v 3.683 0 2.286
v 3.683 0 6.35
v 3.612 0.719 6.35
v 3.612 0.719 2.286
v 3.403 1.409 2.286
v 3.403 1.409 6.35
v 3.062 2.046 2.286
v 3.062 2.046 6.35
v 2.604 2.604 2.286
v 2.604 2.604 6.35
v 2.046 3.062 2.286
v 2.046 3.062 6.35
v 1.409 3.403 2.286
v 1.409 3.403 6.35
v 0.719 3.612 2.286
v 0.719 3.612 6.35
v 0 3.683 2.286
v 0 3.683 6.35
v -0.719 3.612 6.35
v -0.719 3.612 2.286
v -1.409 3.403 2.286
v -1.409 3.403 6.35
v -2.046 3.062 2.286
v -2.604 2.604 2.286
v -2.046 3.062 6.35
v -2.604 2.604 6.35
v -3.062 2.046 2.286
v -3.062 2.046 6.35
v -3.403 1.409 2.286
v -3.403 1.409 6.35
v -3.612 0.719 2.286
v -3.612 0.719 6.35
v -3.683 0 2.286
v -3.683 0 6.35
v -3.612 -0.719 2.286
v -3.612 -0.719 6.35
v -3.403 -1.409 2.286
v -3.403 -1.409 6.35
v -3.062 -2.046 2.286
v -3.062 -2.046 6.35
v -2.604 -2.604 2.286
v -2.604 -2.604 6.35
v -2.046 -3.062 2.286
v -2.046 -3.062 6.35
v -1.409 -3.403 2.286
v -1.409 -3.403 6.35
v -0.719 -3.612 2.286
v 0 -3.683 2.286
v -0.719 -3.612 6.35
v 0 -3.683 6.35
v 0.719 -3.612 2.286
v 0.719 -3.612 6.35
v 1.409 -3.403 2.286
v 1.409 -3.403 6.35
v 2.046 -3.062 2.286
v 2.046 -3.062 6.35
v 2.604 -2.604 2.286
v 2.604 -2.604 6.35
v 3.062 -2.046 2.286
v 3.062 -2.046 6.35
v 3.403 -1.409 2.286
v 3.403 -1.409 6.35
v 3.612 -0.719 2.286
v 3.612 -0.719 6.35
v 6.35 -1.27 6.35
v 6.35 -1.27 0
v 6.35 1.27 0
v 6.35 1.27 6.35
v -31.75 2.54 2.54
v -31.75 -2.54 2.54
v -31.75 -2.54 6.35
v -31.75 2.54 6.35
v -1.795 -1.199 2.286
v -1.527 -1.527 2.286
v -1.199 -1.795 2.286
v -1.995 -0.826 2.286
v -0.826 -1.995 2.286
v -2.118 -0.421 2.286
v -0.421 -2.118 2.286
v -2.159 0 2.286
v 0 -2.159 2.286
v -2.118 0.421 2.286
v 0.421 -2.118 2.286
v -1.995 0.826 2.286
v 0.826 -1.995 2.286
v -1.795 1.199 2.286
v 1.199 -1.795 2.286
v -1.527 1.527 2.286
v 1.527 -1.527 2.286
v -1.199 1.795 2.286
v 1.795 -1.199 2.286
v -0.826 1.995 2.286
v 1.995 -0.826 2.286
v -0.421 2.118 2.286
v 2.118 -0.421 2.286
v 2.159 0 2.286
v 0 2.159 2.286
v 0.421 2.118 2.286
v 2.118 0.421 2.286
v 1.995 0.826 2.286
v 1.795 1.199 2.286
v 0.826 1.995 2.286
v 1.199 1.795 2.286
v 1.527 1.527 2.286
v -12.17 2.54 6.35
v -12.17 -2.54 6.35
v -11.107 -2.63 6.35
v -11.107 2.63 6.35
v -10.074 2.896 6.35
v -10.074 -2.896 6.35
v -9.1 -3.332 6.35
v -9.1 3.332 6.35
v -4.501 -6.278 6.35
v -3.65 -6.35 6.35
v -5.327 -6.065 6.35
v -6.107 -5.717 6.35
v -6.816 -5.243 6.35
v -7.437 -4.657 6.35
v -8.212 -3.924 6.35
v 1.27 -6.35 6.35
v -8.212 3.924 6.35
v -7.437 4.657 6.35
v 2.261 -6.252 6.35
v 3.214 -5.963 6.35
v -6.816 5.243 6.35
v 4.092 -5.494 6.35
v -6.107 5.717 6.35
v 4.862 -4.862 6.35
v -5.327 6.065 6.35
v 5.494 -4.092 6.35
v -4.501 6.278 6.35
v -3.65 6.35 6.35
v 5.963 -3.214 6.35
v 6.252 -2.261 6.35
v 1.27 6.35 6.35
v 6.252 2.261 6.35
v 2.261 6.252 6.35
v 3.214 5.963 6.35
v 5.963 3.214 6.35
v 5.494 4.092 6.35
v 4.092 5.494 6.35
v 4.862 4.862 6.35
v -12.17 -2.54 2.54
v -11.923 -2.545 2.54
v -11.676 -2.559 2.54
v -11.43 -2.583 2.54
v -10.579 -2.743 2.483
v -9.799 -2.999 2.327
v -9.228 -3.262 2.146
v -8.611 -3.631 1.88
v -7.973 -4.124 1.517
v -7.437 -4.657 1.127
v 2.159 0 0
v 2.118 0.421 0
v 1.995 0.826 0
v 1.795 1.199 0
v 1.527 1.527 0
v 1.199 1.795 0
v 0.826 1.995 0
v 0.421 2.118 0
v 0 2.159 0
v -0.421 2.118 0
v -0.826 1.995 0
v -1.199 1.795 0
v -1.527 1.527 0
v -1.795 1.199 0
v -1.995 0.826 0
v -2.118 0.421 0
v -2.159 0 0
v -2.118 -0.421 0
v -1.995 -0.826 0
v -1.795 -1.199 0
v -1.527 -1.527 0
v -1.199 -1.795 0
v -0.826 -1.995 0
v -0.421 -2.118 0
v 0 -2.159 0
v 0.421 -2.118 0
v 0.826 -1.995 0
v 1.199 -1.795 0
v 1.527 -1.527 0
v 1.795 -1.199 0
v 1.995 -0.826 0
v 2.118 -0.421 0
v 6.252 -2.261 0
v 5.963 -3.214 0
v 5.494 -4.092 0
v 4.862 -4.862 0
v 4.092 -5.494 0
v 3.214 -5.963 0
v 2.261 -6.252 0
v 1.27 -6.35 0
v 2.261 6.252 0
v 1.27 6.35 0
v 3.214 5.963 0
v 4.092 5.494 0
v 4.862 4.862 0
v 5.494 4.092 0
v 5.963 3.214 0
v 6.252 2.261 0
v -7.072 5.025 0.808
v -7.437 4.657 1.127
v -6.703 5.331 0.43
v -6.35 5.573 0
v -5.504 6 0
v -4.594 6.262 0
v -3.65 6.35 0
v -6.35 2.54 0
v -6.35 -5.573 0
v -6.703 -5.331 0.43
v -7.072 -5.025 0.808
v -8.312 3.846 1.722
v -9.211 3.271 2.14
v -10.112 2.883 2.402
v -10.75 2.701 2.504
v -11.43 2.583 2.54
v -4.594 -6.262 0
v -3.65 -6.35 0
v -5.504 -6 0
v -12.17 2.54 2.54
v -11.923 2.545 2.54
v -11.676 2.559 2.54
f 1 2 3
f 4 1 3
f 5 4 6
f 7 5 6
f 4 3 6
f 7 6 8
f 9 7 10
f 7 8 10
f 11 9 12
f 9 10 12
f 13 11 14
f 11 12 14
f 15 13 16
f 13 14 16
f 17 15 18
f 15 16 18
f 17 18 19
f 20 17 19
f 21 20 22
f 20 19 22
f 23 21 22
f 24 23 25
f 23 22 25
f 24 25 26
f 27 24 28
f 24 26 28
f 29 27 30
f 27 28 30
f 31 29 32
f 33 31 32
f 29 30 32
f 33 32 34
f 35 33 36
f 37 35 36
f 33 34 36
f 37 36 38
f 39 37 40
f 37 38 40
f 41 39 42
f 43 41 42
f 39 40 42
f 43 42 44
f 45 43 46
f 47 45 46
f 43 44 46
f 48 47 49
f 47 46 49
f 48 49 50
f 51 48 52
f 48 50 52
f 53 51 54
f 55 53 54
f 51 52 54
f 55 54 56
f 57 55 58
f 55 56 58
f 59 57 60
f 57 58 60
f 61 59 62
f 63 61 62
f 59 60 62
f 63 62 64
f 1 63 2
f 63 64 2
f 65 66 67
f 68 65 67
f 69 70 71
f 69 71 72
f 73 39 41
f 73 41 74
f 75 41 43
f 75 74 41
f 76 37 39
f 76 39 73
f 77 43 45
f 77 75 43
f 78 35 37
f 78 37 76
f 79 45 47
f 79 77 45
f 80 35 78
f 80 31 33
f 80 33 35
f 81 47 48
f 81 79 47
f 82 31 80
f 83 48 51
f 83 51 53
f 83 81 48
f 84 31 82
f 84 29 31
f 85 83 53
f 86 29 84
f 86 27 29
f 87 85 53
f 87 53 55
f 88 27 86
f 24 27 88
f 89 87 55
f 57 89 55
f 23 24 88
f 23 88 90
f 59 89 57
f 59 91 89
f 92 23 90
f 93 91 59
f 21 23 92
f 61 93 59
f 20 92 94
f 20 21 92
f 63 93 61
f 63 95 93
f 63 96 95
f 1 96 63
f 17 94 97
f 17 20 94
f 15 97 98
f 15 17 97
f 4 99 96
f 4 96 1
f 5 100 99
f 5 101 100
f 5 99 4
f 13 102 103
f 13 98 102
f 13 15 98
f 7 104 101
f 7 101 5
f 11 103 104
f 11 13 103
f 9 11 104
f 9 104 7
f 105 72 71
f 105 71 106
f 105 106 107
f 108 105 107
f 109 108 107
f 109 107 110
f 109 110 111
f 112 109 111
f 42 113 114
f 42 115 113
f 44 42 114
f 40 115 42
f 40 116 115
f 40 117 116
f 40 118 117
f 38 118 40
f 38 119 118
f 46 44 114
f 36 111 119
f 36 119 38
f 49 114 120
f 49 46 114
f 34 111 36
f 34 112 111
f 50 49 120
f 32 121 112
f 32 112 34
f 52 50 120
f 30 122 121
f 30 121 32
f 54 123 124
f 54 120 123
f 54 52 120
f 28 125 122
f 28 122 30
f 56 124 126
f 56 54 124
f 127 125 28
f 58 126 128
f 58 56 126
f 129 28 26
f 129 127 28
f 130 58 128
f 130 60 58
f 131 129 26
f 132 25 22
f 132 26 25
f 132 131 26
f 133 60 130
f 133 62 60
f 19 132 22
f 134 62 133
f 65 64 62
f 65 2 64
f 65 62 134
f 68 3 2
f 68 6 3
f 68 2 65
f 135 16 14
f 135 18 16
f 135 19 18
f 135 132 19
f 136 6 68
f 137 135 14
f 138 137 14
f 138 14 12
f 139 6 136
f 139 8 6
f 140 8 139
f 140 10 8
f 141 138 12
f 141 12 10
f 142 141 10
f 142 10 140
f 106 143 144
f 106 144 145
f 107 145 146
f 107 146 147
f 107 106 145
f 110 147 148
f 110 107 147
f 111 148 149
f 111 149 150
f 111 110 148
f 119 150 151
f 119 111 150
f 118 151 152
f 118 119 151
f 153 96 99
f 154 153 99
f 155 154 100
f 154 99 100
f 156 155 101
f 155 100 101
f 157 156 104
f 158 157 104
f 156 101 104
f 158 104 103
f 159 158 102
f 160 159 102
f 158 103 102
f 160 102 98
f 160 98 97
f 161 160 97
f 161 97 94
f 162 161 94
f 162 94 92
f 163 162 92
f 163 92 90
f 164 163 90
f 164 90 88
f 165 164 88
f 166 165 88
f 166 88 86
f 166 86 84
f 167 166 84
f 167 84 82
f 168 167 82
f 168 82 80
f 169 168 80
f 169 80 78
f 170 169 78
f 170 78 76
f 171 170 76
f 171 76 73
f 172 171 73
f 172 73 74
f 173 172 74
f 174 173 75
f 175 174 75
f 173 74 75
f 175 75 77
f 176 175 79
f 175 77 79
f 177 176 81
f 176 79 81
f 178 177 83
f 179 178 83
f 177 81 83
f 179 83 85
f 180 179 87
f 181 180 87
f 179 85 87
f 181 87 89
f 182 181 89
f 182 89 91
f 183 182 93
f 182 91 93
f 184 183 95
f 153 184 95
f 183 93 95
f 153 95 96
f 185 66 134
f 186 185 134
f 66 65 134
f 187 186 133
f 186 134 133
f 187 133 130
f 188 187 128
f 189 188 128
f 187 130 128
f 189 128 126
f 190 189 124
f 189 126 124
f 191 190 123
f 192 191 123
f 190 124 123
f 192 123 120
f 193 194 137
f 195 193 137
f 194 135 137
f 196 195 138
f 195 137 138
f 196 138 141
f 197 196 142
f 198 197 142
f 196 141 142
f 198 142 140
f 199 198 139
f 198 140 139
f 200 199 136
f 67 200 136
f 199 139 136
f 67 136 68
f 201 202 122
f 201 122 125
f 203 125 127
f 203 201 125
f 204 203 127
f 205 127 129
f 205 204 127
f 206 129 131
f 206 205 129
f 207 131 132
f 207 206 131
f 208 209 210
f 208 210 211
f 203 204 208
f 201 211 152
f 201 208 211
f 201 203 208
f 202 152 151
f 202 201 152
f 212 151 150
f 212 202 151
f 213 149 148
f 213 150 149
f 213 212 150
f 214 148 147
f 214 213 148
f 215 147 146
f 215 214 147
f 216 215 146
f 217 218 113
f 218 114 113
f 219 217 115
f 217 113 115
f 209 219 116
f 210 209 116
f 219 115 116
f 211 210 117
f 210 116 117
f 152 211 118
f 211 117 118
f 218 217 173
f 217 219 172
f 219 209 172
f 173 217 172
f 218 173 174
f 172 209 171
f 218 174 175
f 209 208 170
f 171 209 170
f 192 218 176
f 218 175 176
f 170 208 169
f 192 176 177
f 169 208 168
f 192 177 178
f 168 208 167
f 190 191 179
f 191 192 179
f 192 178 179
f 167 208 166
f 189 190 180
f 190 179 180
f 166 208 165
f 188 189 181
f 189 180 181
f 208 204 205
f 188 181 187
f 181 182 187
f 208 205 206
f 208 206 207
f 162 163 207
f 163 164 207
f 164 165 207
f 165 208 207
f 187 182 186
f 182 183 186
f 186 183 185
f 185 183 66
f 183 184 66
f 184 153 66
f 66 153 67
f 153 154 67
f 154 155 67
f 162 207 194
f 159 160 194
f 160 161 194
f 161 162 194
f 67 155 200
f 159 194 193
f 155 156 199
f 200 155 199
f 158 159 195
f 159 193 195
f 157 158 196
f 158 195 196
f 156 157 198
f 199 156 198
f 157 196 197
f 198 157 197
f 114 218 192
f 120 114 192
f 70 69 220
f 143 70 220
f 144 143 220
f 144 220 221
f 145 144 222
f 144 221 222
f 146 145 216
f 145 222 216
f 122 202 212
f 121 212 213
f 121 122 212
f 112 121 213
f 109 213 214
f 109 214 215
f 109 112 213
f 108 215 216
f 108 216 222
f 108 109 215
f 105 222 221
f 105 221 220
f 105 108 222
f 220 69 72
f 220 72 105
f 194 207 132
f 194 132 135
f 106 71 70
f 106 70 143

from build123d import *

# Parameters (mm, degrees)
SKETCH1_W           = 38.1
SKETCH1_H           = 12.7
BOSS_EXTRUDE1_DEPTH = 6.35
SKETCH2_R           = 2.159
CUT_EXTRUDE1_DEPTH  = 33.995567884
SKETCH3_R           = 3.683
CUT_EXTRUDE2_DEPTH  = 4.064
SKETCH5_W           = 25.4
SKETCH5_H           = 3.81
CUT_EXTRUDE3_DEPTH  = 33.995567884
SKETCH6_W           = 25.4
SKETCH6_H           = 2.54
CUT_EXTRUDE4_DEPTH  = 34.577032329
FILLET3_R           = 6.35
FILLET4_R           = 5.08


with BuildPart() as part:
    # Sketch1 → Boss-Extrude1 (new body)
    with BuildSketch(Plane.XY):
        with Locations((-12.7, 0)):
            Rectangle(SKETCH1_W, SKETCH1_H)
    extrude(amount=BOSS_EXTRUDE1_DEPTH)

    # Sketch2 → Cut-Extrude1 (cut, through all)
    with BuildSketch(Plane.XY.offset(6.35)):
        Circle(SKETCH2_R)
    extrude(amount=-CUT_EXTRUDE1_DEPTH, mode=Mode.SUBTRACT)

    # Sketch3 → Cut-Extrude2 (cut)
    with BuildSketch(Plane.XY.offset(6.35)):
        Circle(SKETCH3_R)
    extrude(amount=-CUT_EXTRUDE2_DEPTH, mode=Mode.SUBTRACT)

    # Sketch5 → Cut-Extrude3 (cut, through all)
    with BuildSketch(Plane.XY.offset(6.35)):
        with Locations((-19.05, 4.445)):
            Rectangle(SKETCH5_W, SKETCH5_H)
        with Locations((-19.05, -4.445)):
            Rectangle(SKETCH5_W, SKETCH5_H)
    extrude(amount=-CUT_EXTRUDE3_DEPTH, mode=Mode.SUBTRACT)

    # Sketch6 → Cut-Extrude4 (cut, through all)
    with BuildSketch(Plane(origin=(0, 2.54, 0), x_dir=(1, 0, 0), z_dir=(0, 1, 0))):
        with Locations((-19.05, -1.27)):
            Rectangle(SKETCH6_W, SKETCH6_H)
    extrude(amount=-CUT_EXTRUDE4_DEPTH, mode=Mode.SUBTRACT)

    # Fillet3
    # the kernel refuses this fillet: 6.35 mm, written as the material it adds along each edge
    with BuildSketch(Plane(origin=(-6.35, -2.54, 6.35), x_dir=(-1, 0, 0), z_dir=(0, 0, -1))) as fillet3_piece_1:
        with BuildLine():
            CenterArc((5.819871133, -6.35), FILLET3_R, 90, 66.421821522)
            Line((0, -3.81), (-0.116397423, -3.7592))
            ThreePointArc((-0.116397423, -3.7592), (-0.127, -1.905), (-0.127, 0))
            Line((-0.127, 0), (0, 0.127))
            Line((0, 0.127), (5.819871133, 0.127))
            Line((5.819871133, 0.127), (5.819871133, 0))
        make_face()
    extrude(amount=3.81)
    with BuildSketch(Plane(origin=(-6.35, 2.54, 2.54), x_dir=(-1, 0, 0), z_dir=(0, -1, 0))) as fillet3_piece_2:
        with BuildLine():
            CenterArc((5.08, 6.35), FILLET3_R, 216.869897646, 53.130102354)
            Line((0, 2.54), (-0.1016, 2.4638))
            ThreePointArc((-0.1016, 2.4638), (-0.127, 1.27), (-0.127, 0))
            Line((-0.127, 0), (0, -0.127))
            Line((0, -0.127), (5.08, -0.127))
            Line((5.08, -0.127), (5.08, 0))
        make_face()
    extrude(amount=5.08)
    with BuildSketch(Plane(origin=(-6.35, 2.54, 6.35), x_dir=(-1, 0, 0), z_dir=(0, 0, -1))) as fillet3_piece_3:
        with BuildLine():
            CenterArc((5.819871133, 6.35), FILLET3_R, 203.578178478, 66.421821522)
            Line((0, 3.81), (-0.116397423, 3.7592))
            ThreePointArc((-0.116397423, 3.7592), (-0.127, 1.905), (-0.127, 0))
            Line((-0.127, 0), (0, -0.127))
            Line((0, -0.127), (5.819871133, -0.127))
            Line((5.819871133, -0.127), (5.819871133, 0))
        make_face()
    extrude(amount=3.81)
    with BuildSketch(Plane(origin=(-6.35, 2.54, 2.54), x_dir=(-1, 0, 0), z_dir=(0, -1, 0))) as fillet3_piece_4a_section:
        with BuildLine():
            CenterArc((5.08, 6.35), FILLET3_R, 216.869897646, 53.130102354)
            Line((0, 2.54), (-0.1016, 2.4638))
            ThreePointArc((-0.1016, 2.4638), (-0.127, 1.27), (-0.127, 0))
            Line((-0.127, 0), (0, -0.127))
            Line((0, -0.127), (5.08, -0.127))
            Line((5.08, -0.127), (5.08, 0))
        make_face()
    fillet3_piece_4a = extrude(amount=17.78, mode=Mode.PRIVATE)
    fillet3_piece_4a = split(fillet3_piece_4a, bisect_by=Plane(origin=(-7.657359662, -6.35, 1.889832946), z_dir=(0, 1, 0)), keep=Keep.TOP, mode=Mode.PRIVATE)
    fillet3_piece_4a = split(fillet3_piece_4a, bisect_by=Plane(origin=(-7.657359662, -2.54, 1.889832946), z_dir=(0, -1, 0)), keep=Keep.TOP, mode=Mode.PRIVATE)
    with BuildSketch(Plane(origin=(-6.35, -2.54, 6.35), x_dir=(-1, 0, 0), z_dir=(0, 0, -1))) as fillet3_piece_4b_section:
        with BuildLine():
            CenterArc((5.819871133, -6.35), FILLET3_R, 90, 66.421821522)
            Line((0, -3.81), (-0.116397423, -3.7592))
            ThreePointArc((-0.116397423, -3.7592), (-0.127, -1.905), (-0.127, 0))
            Line((-0.127, 0), (0, 0.127))
            Line((0, 0.127), (5.819871133, 0.127))
            Line((5.819871133, 0.127), (5.819871133, 0))
        make_face()
    fillet3_piece_4b = extrude(amount=18.359677831, mode=Mode.PRIVATE)
    fillet3_piece_4b = split(fillet3_piece_4b, bisect_by=Plane(origin=(-7.767240906, -3.525286877, 2.54), z_dir=(0, 0, -1)), keep=Keep.TOP, mode=Mode.PRIVATE)
    fillet3_piece_4b = split(fillet3_piece_4b, bisect_by=Plane(origin=(-7.767240906, -3.525286877, 0), z_dir=(0, 0, 1)), keep=Keep.TOP, mode=Mode.PRIVATE)
    fillet3_piece_4 = fillet3_piece_4a & fillet3_piece_4b
    add(fillet3_piece_4)
    with BuildSketch(Plane(origin=(-6.35, 2.54, 6.35), x_dir=(-1, 0, 0), z_dir=(0, 0, -1))) as fillet3_piece_5a_section:
        with BuildLine():
            CenterArc((5.819871133, 6.35), FILLET3_R, 203.578178478, 66.421821522)
            Line((0, 3.81), (-0.116397423, 3.7592))
            ThreePointArc((-0.116397423, 3.7592), (-0.127, 1.905), (-0.127, 0))
            Line((-0.127, 0), (0, -0.127))
            Line((0, -0.127), (5.819871133, -0.127))
            Line((5.819871133, -0.127), (5.819871133, 0))
        make_face()
    fillet3_piece_5a = extrude(amount=18.359677831, mode=Mode.PRIVATE)
    fillet3_piece_5a = split(fillet3_piece_5a, bisect_by=Plane(origin=(-7.767240906, 3.525286877, 2.54), z_dir=(0, 0, -1)), keep=Keep.TOP, mode=Mode.PRIVATE)
    fillet3_piece_5a = split(fillet3_piece_5a, bisect_by=Plane(origin=(-7.767240906, 3.525286877, 0), z_dir=(0, 0, 1)), keep=Keep.TOP, mode=Mode.PRIVATE)
    with BuildSketch(Plane(origin=(-6.35, 15.24, 2.54), x_dir=(-1, 0, 0), z_dir=(0, -1, 0))) as fillet3_piece_5b_section:
        with BuildLine():
            CenterArc((5.08, 6.35), FILLET3_R, 216.869897646, 53.130102354)
            Line((0, 2.54), (-0.1016, 2.4638))
            ThreePointArc((-0.1016, 2.4638), (-0.127, 1.27), (-0.127, 0))
            Line((-0.127, 0), (0, -0.127))
            Line((0, -0.127), (5.08, -0.127))
            Line((5.08, -0.127), (5.08, 0))
        make_face()
    fillet3_piece_5b = extrude(amount=17.78, mode=Mode.PRIVATE)
    fillet3_piece_5b = split(fillet3_piece_5b, bisect_by=Plane(origin=(-7.657359662, 6.35, 1.889832946), z_dir=(0, -1, 0)), keep=Keep.TOP, mode=Mode.PRIVATE)
    fillet3_piece_5b = split(fillet3_piece_5b, bisect_by=Plane(origin=(-7.657359662, 2.54, 1.889832946), z_dir=(0, 1, 0)), keep=Keep.TOP, mode=Mode.PRIVATE)
    fillet3_piece_5 = fillet3_piece_5a & fillet3_piece_5b
    add(fillet3_piece_5)

    # Fillet4
    fillet4_edges = [part.edges().sort_by_distance(p)[0] for p in [
        (-6.35, 6.35, 3.175),
        (-6.35, -6.35, 3.175),
        (6.35, -6.35, 3.175),
        (6.35, 6.35, 3.175),
    ]]
    fillet(fillet4_edges, radius=FILLET4_R)


solid = part.part
